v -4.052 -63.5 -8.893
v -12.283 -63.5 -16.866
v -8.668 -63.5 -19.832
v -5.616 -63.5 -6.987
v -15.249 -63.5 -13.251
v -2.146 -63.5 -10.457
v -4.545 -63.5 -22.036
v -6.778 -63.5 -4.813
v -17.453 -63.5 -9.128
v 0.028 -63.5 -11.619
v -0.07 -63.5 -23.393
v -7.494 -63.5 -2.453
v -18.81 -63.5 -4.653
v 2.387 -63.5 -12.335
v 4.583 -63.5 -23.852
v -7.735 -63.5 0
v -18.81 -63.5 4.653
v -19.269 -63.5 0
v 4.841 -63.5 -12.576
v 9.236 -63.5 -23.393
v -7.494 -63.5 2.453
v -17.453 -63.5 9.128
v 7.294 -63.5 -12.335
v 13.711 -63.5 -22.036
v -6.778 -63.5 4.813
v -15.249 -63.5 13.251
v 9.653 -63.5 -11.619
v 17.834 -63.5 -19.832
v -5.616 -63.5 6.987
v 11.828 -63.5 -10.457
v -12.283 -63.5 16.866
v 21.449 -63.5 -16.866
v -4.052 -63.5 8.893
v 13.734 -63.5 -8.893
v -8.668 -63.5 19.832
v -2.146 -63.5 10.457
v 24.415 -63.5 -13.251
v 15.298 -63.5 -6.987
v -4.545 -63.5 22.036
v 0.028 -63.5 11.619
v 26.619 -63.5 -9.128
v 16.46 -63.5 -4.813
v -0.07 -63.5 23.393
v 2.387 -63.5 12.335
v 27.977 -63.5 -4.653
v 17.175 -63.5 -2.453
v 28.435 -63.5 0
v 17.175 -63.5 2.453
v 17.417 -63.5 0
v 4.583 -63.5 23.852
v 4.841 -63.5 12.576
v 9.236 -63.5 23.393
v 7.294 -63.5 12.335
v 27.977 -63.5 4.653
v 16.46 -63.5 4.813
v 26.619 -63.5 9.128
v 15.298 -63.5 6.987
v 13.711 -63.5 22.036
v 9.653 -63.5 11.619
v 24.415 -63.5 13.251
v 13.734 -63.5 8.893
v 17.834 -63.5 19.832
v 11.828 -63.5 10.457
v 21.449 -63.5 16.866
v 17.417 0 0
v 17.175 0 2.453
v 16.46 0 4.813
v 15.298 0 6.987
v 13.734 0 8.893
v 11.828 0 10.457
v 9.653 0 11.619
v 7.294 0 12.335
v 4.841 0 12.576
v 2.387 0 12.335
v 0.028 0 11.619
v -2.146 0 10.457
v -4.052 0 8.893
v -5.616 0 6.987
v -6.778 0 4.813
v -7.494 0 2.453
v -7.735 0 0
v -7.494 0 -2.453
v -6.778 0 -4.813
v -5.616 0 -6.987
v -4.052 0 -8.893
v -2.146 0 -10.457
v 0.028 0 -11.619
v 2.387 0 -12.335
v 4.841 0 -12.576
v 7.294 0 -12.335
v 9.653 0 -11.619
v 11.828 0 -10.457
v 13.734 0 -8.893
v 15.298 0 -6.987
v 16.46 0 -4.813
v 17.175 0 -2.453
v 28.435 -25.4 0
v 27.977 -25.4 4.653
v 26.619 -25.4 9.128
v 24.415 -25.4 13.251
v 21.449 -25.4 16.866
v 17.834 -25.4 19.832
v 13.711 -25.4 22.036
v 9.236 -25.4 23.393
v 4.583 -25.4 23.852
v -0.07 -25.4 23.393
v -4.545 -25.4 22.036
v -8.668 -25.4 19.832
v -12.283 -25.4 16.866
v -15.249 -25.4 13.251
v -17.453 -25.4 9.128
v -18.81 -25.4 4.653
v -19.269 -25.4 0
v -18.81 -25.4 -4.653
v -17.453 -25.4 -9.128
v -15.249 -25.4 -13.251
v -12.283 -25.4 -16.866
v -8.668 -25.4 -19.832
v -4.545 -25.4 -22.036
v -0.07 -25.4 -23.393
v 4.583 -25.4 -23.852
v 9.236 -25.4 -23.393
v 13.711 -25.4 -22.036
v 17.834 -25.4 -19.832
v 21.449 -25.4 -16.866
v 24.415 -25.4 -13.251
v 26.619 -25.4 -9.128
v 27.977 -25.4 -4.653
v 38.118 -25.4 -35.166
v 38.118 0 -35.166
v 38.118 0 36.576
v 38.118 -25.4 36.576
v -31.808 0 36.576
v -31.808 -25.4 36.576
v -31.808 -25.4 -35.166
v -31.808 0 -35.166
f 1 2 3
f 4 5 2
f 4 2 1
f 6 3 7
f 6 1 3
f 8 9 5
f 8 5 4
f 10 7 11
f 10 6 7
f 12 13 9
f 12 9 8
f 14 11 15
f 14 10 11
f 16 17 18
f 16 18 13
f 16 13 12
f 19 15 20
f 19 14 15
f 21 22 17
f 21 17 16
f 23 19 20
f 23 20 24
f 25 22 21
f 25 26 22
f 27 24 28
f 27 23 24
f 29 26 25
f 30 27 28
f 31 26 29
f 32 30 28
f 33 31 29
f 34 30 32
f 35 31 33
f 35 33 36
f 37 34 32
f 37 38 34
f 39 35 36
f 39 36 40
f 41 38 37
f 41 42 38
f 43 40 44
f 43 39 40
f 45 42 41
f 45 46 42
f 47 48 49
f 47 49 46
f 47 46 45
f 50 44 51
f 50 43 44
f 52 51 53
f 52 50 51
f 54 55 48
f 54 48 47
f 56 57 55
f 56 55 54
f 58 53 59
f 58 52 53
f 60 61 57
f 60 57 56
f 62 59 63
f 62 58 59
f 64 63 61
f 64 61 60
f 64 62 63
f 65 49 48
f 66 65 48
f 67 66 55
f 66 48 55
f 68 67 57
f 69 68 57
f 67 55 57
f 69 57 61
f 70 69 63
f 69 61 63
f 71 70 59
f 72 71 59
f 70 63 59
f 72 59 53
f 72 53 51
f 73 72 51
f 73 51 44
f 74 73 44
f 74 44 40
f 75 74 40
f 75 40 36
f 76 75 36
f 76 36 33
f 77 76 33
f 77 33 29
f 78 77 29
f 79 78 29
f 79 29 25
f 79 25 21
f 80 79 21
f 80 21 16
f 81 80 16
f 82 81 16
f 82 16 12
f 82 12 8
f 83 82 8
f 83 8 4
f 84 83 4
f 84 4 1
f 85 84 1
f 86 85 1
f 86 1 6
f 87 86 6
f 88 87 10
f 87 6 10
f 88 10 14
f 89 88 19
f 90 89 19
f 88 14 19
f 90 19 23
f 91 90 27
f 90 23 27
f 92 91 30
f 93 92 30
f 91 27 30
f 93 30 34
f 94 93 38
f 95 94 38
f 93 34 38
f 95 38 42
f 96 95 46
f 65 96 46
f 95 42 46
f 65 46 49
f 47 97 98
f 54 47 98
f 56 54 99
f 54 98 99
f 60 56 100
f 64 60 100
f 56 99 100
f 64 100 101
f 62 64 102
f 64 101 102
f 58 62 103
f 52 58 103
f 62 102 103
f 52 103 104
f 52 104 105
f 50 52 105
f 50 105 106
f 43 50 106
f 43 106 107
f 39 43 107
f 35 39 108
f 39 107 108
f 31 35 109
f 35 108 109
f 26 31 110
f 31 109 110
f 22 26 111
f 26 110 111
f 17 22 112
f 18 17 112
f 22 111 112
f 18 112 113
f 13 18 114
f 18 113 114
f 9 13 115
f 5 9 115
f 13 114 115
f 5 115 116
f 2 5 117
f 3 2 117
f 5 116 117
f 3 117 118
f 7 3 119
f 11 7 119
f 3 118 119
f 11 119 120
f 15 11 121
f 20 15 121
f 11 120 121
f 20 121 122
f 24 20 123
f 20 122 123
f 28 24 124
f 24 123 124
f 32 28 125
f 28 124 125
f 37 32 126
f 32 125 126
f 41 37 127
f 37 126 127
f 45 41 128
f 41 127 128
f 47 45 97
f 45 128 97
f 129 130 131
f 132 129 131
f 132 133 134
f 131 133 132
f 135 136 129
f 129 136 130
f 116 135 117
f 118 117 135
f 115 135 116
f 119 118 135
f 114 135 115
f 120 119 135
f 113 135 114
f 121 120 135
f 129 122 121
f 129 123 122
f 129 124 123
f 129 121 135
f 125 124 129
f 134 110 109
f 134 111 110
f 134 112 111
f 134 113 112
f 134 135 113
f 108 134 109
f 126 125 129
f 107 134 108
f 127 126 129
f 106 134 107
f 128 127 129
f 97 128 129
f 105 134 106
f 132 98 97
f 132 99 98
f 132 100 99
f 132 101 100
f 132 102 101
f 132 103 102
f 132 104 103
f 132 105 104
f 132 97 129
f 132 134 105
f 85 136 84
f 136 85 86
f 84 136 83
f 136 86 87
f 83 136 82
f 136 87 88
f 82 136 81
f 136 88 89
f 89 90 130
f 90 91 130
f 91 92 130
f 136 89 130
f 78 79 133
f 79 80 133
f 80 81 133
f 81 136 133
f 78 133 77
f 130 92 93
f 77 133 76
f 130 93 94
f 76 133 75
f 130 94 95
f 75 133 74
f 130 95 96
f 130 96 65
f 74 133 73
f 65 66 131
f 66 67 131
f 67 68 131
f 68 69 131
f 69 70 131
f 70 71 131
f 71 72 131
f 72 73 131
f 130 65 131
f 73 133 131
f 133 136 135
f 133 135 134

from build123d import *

# Parameters (mm, degrees)
F0_W     = 69.926764816
F0_H     = 71.7419460416
F1_DEPTH = 25.4
F3_R     = 23.8517275111
F4_DEPTH = 38.1
F5_R     = 12.5762061787
F6_DEPTH = 63.501


with BuildPart() as f1:
    # F0 (on Front) → F1 (new body)
    with BuildSketch(Plane.XZ):
        with Locations((3.1551141292, 0.7052309811)):
            Rectangle(F0_W, F0_H)
    extrude(amount=F1_DEPTH)

    # F3 (on face) → F4 (join)
    with BuildSketch(Plane.XZ.offset(25.4)):
        with Locations((4.5831017196, 0)):
            Circle(F3_R)
    extrude(amount=F4_DEPTH)

    # F5 (on face) → F6 (cut, through all)
    with BuildSketch(Plane.XZ.offset(63.5)):
        with Locations((4.8407912254, 0)):
            Circle(F5_R)
    extrude(amount=-F6_DEPTH, mode=Mode.SUBTRACT)


solid = f1.part
